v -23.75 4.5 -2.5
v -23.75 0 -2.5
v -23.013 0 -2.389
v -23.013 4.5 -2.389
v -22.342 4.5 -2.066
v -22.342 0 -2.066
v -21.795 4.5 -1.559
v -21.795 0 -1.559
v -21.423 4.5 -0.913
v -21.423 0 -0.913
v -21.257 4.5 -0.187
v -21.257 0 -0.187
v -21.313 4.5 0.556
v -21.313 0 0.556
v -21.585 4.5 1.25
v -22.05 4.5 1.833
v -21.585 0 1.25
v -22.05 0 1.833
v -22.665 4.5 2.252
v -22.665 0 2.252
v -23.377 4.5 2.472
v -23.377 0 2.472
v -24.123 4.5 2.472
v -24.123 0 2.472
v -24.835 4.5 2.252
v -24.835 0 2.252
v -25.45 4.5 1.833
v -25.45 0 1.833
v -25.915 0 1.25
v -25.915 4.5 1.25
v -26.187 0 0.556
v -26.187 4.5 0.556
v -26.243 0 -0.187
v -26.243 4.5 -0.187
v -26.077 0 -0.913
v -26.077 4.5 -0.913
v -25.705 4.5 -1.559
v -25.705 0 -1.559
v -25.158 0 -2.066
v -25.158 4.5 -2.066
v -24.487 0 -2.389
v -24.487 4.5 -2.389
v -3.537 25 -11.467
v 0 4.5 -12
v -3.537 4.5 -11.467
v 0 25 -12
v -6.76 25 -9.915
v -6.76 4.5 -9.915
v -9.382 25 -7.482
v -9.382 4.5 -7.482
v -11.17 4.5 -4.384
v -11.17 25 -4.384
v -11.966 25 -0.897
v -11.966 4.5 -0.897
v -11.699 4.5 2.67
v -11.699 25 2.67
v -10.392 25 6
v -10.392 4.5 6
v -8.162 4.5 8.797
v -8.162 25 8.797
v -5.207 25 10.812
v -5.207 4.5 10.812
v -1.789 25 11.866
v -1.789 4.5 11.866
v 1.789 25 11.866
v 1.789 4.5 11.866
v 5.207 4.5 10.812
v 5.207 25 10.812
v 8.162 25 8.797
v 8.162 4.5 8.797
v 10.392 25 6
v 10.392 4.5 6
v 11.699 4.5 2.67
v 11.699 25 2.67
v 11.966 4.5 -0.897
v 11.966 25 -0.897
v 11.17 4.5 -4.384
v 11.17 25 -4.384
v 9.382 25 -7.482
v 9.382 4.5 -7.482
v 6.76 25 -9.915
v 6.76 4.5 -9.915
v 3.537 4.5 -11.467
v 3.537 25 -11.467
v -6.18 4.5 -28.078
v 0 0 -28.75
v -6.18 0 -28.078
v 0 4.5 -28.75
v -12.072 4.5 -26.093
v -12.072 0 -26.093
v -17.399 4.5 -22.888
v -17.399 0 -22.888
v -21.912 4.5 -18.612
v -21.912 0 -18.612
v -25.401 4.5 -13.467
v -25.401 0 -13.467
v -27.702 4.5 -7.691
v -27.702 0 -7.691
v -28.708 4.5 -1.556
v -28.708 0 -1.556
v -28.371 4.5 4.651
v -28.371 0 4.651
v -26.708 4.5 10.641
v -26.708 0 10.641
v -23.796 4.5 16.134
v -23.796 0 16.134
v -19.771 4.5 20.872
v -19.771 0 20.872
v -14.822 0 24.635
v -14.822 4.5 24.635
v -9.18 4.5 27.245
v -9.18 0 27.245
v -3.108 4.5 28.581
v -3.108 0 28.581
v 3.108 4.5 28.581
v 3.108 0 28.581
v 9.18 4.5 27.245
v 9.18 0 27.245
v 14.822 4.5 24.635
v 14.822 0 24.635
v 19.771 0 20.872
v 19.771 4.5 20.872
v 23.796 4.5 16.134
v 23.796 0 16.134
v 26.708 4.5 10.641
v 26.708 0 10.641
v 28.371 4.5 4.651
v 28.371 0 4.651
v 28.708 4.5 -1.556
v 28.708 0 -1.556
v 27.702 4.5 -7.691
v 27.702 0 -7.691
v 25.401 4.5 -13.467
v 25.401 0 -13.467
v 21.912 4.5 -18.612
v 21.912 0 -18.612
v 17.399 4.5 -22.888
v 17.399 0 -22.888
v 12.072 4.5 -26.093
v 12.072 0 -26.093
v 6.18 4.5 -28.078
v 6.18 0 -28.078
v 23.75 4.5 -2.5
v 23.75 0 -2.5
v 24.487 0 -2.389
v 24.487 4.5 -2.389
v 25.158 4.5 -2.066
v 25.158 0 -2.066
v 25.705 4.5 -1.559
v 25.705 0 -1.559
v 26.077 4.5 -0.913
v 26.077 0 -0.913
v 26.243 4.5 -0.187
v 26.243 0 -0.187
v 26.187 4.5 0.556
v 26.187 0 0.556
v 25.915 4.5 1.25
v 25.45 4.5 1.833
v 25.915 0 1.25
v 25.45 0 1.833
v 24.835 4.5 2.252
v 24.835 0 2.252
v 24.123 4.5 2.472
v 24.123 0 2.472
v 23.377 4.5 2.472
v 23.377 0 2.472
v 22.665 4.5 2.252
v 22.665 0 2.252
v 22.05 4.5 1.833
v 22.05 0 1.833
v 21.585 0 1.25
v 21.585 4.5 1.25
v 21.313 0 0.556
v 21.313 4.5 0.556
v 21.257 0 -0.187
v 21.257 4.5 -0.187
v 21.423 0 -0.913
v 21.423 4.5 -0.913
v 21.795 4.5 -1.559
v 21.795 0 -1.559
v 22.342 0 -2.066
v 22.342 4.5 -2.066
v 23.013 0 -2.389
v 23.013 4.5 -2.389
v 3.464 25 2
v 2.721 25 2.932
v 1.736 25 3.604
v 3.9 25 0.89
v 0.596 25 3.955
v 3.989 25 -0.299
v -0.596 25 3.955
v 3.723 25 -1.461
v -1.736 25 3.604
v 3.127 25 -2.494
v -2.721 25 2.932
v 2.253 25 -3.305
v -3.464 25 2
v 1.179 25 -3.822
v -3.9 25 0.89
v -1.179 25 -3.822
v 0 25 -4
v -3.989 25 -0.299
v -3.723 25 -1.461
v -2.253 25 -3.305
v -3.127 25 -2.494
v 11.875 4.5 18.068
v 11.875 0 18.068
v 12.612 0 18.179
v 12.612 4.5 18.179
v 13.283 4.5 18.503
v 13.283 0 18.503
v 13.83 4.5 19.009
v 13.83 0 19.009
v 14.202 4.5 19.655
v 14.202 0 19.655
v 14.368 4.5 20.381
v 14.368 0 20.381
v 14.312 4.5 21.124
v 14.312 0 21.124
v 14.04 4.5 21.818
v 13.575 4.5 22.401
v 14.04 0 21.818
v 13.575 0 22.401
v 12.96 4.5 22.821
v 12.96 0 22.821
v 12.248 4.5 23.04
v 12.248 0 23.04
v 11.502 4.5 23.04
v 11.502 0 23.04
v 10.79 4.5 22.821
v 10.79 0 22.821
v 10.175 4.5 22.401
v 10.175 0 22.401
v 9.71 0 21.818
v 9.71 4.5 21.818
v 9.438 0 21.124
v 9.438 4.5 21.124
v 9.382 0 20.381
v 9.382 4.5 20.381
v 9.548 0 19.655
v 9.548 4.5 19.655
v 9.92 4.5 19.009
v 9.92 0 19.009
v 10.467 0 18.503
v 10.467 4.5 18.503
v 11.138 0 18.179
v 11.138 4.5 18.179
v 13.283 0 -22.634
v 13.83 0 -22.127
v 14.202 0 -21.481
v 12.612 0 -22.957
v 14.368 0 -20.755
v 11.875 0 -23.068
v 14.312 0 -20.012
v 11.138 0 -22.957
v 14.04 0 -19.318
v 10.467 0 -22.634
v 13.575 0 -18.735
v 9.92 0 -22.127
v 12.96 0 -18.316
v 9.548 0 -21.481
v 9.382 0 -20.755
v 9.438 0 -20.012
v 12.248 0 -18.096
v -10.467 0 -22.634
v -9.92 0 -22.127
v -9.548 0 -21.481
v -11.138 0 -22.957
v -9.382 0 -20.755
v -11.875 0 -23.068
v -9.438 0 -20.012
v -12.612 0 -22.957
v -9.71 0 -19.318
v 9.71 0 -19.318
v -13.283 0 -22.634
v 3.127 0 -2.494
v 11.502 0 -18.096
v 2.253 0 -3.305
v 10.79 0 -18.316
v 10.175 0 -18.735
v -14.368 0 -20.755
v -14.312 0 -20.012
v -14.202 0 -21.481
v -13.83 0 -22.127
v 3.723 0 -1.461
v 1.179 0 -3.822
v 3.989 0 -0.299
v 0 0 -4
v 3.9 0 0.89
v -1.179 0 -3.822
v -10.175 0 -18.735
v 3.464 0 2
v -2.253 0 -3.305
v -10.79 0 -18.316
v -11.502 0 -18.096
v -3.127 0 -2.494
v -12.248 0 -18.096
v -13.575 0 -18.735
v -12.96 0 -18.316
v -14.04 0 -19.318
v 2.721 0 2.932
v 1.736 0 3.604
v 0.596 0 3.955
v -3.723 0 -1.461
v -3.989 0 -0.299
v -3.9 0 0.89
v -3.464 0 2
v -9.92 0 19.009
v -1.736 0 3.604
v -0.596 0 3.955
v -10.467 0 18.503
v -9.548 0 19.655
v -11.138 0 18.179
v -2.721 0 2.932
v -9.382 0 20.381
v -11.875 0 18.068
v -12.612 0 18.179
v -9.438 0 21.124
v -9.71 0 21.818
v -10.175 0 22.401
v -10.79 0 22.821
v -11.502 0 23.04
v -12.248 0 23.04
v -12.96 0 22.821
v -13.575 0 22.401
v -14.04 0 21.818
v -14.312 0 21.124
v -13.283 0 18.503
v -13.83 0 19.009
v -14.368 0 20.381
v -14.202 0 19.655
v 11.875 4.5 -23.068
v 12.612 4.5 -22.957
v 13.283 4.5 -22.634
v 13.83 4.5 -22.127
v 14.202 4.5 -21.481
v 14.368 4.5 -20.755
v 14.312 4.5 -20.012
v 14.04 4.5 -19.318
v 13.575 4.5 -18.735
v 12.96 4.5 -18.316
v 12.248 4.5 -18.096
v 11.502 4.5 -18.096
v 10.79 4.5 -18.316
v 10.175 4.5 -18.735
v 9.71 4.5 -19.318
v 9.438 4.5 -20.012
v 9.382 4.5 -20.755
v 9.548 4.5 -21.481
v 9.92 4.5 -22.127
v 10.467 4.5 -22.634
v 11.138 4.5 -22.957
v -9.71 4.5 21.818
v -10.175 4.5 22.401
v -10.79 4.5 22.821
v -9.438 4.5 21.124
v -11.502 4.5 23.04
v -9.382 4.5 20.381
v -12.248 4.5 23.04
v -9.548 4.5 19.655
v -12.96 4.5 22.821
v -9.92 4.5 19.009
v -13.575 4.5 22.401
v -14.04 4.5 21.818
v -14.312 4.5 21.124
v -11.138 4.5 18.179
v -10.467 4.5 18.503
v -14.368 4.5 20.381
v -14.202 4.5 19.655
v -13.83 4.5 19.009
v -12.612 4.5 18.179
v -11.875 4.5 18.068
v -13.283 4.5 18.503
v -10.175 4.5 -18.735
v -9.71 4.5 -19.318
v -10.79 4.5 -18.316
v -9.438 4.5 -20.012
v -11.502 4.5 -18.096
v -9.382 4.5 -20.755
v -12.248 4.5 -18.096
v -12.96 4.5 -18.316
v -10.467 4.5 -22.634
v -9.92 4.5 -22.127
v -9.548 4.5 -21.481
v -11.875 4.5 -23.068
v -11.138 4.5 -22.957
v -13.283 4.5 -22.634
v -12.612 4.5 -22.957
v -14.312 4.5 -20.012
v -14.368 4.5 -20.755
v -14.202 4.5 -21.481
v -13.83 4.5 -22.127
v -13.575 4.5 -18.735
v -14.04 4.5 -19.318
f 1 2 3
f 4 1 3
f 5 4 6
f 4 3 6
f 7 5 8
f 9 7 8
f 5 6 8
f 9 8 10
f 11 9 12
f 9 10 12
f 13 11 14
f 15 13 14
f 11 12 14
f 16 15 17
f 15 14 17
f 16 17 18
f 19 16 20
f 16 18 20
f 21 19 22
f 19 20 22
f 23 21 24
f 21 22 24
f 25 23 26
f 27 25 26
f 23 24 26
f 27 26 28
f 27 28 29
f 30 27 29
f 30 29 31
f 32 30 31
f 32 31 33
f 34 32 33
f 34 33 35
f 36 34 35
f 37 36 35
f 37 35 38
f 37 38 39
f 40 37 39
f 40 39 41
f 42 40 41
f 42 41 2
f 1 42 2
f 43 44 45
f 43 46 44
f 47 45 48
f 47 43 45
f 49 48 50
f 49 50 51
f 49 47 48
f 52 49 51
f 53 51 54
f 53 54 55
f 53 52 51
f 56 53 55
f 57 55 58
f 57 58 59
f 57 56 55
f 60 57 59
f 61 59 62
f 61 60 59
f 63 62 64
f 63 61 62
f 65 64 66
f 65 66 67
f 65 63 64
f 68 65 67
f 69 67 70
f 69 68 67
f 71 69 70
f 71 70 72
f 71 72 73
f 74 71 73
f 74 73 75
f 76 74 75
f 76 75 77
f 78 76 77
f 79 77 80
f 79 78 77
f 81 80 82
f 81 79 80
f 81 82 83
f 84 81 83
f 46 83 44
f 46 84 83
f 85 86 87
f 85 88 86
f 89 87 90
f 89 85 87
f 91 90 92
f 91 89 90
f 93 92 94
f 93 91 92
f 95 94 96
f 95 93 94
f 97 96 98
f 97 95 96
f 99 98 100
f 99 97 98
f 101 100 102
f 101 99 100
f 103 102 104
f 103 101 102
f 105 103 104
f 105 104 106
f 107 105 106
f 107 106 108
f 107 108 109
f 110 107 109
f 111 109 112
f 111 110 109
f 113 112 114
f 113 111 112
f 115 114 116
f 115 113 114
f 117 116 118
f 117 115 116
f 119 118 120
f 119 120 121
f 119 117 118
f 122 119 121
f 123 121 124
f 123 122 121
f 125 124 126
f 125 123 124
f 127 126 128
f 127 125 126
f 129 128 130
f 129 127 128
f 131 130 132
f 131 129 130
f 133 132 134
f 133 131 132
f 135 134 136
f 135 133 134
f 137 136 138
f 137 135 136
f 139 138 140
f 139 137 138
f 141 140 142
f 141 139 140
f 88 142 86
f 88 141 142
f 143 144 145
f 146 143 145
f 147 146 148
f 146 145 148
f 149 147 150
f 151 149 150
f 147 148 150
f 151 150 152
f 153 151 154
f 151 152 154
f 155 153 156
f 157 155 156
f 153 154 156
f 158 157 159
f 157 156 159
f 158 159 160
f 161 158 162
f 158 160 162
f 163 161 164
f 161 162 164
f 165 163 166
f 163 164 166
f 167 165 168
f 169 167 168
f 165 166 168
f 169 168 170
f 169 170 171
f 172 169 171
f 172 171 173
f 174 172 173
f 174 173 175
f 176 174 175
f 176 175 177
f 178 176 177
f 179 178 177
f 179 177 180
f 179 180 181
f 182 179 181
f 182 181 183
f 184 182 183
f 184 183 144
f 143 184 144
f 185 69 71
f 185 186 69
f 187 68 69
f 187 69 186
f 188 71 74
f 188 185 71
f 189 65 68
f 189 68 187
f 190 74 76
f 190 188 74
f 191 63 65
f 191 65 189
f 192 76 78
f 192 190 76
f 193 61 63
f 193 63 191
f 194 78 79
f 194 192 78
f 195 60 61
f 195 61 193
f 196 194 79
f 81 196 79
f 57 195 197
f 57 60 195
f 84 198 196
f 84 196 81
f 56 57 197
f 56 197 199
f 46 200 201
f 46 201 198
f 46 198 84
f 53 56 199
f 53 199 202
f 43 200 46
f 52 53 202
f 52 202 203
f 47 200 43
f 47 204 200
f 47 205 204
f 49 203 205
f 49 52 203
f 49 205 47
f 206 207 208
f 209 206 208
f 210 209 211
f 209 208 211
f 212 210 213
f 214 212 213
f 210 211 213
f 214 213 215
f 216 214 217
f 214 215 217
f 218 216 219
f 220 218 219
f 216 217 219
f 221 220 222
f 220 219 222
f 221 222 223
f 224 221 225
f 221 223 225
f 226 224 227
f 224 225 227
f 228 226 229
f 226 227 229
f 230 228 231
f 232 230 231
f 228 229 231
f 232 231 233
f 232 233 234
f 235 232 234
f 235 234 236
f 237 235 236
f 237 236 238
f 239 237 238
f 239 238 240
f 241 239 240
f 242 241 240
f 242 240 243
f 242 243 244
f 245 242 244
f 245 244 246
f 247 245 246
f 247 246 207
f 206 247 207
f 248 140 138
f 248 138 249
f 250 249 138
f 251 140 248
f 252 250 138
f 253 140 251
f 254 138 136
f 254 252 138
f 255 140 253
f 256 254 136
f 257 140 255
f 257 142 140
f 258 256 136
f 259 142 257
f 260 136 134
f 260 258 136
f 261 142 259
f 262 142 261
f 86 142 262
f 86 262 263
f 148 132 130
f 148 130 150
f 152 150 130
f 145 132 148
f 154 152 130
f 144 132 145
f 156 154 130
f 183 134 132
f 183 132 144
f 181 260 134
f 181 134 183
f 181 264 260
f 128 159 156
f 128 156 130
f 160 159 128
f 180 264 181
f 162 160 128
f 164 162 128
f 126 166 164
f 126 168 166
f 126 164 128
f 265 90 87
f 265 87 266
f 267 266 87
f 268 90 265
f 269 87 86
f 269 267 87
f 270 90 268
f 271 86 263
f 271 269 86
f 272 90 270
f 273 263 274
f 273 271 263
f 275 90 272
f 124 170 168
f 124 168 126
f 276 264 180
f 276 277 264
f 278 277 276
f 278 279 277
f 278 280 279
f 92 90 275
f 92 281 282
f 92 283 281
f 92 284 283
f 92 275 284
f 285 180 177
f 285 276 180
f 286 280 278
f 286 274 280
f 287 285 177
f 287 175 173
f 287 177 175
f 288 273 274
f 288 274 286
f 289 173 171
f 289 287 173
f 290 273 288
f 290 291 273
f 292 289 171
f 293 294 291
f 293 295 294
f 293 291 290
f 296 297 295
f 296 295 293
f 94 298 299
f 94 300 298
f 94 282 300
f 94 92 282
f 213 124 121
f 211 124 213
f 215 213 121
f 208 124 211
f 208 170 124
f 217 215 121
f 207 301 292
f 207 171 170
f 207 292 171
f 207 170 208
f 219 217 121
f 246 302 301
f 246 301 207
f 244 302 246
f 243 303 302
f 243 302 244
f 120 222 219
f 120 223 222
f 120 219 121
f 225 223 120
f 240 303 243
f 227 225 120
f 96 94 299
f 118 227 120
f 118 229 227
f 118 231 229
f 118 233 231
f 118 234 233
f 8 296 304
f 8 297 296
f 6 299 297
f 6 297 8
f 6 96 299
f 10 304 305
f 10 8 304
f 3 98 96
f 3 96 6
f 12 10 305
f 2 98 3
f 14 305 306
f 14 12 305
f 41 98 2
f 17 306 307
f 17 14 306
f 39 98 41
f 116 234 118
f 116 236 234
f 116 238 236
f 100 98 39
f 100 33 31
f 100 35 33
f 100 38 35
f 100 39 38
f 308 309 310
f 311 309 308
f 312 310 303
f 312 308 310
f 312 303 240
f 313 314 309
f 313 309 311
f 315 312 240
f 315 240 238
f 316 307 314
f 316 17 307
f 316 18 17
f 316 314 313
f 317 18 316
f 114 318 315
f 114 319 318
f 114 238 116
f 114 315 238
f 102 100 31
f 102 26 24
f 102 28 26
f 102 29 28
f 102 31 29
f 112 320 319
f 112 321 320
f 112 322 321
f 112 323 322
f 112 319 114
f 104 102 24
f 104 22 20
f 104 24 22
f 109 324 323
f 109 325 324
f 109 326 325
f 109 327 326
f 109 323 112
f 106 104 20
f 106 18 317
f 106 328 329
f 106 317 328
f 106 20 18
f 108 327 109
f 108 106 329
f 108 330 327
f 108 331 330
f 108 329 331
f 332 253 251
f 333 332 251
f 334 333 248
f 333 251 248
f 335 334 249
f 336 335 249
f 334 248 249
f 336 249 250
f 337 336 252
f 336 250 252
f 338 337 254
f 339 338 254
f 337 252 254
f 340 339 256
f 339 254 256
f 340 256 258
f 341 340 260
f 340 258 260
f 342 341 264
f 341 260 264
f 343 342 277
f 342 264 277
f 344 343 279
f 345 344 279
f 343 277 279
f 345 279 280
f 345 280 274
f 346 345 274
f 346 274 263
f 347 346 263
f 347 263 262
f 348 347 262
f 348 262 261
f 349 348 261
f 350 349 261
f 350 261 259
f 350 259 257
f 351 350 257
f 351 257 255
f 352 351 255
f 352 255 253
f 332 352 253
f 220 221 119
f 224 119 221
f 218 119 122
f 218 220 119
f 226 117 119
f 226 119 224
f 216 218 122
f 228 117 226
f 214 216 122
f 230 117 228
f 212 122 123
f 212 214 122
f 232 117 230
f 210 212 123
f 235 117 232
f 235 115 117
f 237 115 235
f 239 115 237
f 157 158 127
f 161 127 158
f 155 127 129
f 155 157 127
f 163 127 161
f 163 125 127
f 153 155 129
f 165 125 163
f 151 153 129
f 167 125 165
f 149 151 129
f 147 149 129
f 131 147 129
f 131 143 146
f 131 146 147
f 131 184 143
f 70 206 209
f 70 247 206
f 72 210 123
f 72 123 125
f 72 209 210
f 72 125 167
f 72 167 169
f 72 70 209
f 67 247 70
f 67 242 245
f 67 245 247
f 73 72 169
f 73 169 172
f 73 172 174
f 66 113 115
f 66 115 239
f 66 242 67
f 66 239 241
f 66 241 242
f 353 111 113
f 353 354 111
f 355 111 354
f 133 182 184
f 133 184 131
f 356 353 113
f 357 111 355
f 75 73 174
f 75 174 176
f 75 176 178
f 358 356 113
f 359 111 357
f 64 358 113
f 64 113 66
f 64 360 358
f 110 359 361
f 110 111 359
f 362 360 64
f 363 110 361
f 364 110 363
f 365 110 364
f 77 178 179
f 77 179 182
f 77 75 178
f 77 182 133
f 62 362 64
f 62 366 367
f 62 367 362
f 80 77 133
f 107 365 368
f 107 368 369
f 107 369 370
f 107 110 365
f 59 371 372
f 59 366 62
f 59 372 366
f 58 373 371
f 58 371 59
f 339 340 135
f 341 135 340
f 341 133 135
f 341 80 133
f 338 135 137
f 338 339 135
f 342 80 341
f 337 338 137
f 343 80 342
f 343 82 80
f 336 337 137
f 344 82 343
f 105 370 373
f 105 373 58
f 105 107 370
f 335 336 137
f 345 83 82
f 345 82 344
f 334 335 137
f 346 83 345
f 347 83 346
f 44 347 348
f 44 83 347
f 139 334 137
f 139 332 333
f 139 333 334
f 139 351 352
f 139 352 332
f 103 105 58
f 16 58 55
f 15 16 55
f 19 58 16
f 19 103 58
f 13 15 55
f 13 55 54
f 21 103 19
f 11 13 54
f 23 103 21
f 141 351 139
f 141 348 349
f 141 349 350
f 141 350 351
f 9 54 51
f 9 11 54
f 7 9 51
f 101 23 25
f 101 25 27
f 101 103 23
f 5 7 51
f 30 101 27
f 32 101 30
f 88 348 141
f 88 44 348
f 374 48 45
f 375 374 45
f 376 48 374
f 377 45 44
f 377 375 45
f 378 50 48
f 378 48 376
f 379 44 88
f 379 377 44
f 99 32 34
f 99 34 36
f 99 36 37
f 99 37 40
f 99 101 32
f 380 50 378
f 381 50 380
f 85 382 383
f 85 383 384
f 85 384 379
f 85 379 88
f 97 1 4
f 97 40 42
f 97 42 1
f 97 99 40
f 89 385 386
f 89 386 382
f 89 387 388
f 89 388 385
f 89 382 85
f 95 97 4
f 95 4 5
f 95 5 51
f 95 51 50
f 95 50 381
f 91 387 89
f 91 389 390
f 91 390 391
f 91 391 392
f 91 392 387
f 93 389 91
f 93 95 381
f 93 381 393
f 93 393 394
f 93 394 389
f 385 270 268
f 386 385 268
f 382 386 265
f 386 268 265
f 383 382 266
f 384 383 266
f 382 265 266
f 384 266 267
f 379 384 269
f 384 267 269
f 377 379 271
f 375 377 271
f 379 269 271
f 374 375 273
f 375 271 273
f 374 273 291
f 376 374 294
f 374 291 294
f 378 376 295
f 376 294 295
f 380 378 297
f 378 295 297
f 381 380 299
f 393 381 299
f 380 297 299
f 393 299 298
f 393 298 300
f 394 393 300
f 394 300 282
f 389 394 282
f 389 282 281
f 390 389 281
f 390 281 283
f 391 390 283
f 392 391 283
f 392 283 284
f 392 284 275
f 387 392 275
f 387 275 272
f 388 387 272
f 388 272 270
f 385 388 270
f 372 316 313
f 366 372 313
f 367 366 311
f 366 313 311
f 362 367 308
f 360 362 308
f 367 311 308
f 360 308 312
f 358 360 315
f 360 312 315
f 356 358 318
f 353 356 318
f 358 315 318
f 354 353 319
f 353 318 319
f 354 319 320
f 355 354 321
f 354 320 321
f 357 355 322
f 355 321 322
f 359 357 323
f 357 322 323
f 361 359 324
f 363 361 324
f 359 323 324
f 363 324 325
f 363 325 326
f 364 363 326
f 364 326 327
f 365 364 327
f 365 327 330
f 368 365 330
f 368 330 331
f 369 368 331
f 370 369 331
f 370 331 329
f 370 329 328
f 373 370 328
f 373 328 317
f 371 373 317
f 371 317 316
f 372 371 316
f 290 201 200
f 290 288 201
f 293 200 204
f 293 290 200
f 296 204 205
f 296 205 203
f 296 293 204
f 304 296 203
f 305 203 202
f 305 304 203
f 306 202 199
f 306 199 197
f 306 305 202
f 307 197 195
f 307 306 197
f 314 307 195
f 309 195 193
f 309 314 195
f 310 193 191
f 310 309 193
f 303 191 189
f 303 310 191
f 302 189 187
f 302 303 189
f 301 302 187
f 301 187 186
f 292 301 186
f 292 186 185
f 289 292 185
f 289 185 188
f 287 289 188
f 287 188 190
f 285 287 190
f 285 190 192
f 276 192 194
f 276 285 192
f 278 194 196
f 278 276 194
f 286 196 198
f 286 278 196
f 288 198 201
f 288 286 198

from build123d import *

# Parameters (mm, degrees)
ESQUISSE2_R             = 2.5
ENL_V_MAT_EXTRU_1_DEPTH = 48.72970773


with BuildPart() as part:
    # Esquisse1 → Révolution1 (revolve)
    with BuildSketch(Plane.XY, mode=Mode.PRIVATE) as r_volution1_sk:
        Polygon((4, 0), (28.75, 0), (28.75, 4.5), (12, 4.5), (12, 25), (4, 25), align=None)
    revolve(r_volution1_sk.sketch.rotate(Axis((0, 0, 0), (0, 1, 0)), 90), axis=Axis((0, 0, 0), (0, 1, 0)))

    # Esquisse2 → Enlèv. mat.-Extru.1 (cut, through all)
    with BuildSketch(Plane.XZ):
        with Locations(Location((23.75, 0, 0), (0, 0, 270))):
            Circle(ESQUISSE2_R)
        with Locations(Location((11.875, -20.56810334, 0), (0, 0, 270))):
            Circle(ESQUISSE2_R)
        with Locations(Location((-11.875, -20.56810334, 0), (0, 0, 270))):
            Circle(ESQUISSE2_R)
        with Locations(Location((-23.75, 0, 0), (0, 0, 270))):
            Circle(ESQUISSE2_R)
        with Locations(Location((-11.875, 20.56810334, 0), (0, 0, 270))):
            Circle(ESQUISSE2_R)
        with Locations(Location((11.875, 20.56810334, 0), (0, 0, 270))):
            Circle(ESQUISSE2_R)
    extrude(amount=-ENL_V_MAT_EXTRU_1_DEPTH, mode=Mode.SUBTRACT)


solid = part.part
